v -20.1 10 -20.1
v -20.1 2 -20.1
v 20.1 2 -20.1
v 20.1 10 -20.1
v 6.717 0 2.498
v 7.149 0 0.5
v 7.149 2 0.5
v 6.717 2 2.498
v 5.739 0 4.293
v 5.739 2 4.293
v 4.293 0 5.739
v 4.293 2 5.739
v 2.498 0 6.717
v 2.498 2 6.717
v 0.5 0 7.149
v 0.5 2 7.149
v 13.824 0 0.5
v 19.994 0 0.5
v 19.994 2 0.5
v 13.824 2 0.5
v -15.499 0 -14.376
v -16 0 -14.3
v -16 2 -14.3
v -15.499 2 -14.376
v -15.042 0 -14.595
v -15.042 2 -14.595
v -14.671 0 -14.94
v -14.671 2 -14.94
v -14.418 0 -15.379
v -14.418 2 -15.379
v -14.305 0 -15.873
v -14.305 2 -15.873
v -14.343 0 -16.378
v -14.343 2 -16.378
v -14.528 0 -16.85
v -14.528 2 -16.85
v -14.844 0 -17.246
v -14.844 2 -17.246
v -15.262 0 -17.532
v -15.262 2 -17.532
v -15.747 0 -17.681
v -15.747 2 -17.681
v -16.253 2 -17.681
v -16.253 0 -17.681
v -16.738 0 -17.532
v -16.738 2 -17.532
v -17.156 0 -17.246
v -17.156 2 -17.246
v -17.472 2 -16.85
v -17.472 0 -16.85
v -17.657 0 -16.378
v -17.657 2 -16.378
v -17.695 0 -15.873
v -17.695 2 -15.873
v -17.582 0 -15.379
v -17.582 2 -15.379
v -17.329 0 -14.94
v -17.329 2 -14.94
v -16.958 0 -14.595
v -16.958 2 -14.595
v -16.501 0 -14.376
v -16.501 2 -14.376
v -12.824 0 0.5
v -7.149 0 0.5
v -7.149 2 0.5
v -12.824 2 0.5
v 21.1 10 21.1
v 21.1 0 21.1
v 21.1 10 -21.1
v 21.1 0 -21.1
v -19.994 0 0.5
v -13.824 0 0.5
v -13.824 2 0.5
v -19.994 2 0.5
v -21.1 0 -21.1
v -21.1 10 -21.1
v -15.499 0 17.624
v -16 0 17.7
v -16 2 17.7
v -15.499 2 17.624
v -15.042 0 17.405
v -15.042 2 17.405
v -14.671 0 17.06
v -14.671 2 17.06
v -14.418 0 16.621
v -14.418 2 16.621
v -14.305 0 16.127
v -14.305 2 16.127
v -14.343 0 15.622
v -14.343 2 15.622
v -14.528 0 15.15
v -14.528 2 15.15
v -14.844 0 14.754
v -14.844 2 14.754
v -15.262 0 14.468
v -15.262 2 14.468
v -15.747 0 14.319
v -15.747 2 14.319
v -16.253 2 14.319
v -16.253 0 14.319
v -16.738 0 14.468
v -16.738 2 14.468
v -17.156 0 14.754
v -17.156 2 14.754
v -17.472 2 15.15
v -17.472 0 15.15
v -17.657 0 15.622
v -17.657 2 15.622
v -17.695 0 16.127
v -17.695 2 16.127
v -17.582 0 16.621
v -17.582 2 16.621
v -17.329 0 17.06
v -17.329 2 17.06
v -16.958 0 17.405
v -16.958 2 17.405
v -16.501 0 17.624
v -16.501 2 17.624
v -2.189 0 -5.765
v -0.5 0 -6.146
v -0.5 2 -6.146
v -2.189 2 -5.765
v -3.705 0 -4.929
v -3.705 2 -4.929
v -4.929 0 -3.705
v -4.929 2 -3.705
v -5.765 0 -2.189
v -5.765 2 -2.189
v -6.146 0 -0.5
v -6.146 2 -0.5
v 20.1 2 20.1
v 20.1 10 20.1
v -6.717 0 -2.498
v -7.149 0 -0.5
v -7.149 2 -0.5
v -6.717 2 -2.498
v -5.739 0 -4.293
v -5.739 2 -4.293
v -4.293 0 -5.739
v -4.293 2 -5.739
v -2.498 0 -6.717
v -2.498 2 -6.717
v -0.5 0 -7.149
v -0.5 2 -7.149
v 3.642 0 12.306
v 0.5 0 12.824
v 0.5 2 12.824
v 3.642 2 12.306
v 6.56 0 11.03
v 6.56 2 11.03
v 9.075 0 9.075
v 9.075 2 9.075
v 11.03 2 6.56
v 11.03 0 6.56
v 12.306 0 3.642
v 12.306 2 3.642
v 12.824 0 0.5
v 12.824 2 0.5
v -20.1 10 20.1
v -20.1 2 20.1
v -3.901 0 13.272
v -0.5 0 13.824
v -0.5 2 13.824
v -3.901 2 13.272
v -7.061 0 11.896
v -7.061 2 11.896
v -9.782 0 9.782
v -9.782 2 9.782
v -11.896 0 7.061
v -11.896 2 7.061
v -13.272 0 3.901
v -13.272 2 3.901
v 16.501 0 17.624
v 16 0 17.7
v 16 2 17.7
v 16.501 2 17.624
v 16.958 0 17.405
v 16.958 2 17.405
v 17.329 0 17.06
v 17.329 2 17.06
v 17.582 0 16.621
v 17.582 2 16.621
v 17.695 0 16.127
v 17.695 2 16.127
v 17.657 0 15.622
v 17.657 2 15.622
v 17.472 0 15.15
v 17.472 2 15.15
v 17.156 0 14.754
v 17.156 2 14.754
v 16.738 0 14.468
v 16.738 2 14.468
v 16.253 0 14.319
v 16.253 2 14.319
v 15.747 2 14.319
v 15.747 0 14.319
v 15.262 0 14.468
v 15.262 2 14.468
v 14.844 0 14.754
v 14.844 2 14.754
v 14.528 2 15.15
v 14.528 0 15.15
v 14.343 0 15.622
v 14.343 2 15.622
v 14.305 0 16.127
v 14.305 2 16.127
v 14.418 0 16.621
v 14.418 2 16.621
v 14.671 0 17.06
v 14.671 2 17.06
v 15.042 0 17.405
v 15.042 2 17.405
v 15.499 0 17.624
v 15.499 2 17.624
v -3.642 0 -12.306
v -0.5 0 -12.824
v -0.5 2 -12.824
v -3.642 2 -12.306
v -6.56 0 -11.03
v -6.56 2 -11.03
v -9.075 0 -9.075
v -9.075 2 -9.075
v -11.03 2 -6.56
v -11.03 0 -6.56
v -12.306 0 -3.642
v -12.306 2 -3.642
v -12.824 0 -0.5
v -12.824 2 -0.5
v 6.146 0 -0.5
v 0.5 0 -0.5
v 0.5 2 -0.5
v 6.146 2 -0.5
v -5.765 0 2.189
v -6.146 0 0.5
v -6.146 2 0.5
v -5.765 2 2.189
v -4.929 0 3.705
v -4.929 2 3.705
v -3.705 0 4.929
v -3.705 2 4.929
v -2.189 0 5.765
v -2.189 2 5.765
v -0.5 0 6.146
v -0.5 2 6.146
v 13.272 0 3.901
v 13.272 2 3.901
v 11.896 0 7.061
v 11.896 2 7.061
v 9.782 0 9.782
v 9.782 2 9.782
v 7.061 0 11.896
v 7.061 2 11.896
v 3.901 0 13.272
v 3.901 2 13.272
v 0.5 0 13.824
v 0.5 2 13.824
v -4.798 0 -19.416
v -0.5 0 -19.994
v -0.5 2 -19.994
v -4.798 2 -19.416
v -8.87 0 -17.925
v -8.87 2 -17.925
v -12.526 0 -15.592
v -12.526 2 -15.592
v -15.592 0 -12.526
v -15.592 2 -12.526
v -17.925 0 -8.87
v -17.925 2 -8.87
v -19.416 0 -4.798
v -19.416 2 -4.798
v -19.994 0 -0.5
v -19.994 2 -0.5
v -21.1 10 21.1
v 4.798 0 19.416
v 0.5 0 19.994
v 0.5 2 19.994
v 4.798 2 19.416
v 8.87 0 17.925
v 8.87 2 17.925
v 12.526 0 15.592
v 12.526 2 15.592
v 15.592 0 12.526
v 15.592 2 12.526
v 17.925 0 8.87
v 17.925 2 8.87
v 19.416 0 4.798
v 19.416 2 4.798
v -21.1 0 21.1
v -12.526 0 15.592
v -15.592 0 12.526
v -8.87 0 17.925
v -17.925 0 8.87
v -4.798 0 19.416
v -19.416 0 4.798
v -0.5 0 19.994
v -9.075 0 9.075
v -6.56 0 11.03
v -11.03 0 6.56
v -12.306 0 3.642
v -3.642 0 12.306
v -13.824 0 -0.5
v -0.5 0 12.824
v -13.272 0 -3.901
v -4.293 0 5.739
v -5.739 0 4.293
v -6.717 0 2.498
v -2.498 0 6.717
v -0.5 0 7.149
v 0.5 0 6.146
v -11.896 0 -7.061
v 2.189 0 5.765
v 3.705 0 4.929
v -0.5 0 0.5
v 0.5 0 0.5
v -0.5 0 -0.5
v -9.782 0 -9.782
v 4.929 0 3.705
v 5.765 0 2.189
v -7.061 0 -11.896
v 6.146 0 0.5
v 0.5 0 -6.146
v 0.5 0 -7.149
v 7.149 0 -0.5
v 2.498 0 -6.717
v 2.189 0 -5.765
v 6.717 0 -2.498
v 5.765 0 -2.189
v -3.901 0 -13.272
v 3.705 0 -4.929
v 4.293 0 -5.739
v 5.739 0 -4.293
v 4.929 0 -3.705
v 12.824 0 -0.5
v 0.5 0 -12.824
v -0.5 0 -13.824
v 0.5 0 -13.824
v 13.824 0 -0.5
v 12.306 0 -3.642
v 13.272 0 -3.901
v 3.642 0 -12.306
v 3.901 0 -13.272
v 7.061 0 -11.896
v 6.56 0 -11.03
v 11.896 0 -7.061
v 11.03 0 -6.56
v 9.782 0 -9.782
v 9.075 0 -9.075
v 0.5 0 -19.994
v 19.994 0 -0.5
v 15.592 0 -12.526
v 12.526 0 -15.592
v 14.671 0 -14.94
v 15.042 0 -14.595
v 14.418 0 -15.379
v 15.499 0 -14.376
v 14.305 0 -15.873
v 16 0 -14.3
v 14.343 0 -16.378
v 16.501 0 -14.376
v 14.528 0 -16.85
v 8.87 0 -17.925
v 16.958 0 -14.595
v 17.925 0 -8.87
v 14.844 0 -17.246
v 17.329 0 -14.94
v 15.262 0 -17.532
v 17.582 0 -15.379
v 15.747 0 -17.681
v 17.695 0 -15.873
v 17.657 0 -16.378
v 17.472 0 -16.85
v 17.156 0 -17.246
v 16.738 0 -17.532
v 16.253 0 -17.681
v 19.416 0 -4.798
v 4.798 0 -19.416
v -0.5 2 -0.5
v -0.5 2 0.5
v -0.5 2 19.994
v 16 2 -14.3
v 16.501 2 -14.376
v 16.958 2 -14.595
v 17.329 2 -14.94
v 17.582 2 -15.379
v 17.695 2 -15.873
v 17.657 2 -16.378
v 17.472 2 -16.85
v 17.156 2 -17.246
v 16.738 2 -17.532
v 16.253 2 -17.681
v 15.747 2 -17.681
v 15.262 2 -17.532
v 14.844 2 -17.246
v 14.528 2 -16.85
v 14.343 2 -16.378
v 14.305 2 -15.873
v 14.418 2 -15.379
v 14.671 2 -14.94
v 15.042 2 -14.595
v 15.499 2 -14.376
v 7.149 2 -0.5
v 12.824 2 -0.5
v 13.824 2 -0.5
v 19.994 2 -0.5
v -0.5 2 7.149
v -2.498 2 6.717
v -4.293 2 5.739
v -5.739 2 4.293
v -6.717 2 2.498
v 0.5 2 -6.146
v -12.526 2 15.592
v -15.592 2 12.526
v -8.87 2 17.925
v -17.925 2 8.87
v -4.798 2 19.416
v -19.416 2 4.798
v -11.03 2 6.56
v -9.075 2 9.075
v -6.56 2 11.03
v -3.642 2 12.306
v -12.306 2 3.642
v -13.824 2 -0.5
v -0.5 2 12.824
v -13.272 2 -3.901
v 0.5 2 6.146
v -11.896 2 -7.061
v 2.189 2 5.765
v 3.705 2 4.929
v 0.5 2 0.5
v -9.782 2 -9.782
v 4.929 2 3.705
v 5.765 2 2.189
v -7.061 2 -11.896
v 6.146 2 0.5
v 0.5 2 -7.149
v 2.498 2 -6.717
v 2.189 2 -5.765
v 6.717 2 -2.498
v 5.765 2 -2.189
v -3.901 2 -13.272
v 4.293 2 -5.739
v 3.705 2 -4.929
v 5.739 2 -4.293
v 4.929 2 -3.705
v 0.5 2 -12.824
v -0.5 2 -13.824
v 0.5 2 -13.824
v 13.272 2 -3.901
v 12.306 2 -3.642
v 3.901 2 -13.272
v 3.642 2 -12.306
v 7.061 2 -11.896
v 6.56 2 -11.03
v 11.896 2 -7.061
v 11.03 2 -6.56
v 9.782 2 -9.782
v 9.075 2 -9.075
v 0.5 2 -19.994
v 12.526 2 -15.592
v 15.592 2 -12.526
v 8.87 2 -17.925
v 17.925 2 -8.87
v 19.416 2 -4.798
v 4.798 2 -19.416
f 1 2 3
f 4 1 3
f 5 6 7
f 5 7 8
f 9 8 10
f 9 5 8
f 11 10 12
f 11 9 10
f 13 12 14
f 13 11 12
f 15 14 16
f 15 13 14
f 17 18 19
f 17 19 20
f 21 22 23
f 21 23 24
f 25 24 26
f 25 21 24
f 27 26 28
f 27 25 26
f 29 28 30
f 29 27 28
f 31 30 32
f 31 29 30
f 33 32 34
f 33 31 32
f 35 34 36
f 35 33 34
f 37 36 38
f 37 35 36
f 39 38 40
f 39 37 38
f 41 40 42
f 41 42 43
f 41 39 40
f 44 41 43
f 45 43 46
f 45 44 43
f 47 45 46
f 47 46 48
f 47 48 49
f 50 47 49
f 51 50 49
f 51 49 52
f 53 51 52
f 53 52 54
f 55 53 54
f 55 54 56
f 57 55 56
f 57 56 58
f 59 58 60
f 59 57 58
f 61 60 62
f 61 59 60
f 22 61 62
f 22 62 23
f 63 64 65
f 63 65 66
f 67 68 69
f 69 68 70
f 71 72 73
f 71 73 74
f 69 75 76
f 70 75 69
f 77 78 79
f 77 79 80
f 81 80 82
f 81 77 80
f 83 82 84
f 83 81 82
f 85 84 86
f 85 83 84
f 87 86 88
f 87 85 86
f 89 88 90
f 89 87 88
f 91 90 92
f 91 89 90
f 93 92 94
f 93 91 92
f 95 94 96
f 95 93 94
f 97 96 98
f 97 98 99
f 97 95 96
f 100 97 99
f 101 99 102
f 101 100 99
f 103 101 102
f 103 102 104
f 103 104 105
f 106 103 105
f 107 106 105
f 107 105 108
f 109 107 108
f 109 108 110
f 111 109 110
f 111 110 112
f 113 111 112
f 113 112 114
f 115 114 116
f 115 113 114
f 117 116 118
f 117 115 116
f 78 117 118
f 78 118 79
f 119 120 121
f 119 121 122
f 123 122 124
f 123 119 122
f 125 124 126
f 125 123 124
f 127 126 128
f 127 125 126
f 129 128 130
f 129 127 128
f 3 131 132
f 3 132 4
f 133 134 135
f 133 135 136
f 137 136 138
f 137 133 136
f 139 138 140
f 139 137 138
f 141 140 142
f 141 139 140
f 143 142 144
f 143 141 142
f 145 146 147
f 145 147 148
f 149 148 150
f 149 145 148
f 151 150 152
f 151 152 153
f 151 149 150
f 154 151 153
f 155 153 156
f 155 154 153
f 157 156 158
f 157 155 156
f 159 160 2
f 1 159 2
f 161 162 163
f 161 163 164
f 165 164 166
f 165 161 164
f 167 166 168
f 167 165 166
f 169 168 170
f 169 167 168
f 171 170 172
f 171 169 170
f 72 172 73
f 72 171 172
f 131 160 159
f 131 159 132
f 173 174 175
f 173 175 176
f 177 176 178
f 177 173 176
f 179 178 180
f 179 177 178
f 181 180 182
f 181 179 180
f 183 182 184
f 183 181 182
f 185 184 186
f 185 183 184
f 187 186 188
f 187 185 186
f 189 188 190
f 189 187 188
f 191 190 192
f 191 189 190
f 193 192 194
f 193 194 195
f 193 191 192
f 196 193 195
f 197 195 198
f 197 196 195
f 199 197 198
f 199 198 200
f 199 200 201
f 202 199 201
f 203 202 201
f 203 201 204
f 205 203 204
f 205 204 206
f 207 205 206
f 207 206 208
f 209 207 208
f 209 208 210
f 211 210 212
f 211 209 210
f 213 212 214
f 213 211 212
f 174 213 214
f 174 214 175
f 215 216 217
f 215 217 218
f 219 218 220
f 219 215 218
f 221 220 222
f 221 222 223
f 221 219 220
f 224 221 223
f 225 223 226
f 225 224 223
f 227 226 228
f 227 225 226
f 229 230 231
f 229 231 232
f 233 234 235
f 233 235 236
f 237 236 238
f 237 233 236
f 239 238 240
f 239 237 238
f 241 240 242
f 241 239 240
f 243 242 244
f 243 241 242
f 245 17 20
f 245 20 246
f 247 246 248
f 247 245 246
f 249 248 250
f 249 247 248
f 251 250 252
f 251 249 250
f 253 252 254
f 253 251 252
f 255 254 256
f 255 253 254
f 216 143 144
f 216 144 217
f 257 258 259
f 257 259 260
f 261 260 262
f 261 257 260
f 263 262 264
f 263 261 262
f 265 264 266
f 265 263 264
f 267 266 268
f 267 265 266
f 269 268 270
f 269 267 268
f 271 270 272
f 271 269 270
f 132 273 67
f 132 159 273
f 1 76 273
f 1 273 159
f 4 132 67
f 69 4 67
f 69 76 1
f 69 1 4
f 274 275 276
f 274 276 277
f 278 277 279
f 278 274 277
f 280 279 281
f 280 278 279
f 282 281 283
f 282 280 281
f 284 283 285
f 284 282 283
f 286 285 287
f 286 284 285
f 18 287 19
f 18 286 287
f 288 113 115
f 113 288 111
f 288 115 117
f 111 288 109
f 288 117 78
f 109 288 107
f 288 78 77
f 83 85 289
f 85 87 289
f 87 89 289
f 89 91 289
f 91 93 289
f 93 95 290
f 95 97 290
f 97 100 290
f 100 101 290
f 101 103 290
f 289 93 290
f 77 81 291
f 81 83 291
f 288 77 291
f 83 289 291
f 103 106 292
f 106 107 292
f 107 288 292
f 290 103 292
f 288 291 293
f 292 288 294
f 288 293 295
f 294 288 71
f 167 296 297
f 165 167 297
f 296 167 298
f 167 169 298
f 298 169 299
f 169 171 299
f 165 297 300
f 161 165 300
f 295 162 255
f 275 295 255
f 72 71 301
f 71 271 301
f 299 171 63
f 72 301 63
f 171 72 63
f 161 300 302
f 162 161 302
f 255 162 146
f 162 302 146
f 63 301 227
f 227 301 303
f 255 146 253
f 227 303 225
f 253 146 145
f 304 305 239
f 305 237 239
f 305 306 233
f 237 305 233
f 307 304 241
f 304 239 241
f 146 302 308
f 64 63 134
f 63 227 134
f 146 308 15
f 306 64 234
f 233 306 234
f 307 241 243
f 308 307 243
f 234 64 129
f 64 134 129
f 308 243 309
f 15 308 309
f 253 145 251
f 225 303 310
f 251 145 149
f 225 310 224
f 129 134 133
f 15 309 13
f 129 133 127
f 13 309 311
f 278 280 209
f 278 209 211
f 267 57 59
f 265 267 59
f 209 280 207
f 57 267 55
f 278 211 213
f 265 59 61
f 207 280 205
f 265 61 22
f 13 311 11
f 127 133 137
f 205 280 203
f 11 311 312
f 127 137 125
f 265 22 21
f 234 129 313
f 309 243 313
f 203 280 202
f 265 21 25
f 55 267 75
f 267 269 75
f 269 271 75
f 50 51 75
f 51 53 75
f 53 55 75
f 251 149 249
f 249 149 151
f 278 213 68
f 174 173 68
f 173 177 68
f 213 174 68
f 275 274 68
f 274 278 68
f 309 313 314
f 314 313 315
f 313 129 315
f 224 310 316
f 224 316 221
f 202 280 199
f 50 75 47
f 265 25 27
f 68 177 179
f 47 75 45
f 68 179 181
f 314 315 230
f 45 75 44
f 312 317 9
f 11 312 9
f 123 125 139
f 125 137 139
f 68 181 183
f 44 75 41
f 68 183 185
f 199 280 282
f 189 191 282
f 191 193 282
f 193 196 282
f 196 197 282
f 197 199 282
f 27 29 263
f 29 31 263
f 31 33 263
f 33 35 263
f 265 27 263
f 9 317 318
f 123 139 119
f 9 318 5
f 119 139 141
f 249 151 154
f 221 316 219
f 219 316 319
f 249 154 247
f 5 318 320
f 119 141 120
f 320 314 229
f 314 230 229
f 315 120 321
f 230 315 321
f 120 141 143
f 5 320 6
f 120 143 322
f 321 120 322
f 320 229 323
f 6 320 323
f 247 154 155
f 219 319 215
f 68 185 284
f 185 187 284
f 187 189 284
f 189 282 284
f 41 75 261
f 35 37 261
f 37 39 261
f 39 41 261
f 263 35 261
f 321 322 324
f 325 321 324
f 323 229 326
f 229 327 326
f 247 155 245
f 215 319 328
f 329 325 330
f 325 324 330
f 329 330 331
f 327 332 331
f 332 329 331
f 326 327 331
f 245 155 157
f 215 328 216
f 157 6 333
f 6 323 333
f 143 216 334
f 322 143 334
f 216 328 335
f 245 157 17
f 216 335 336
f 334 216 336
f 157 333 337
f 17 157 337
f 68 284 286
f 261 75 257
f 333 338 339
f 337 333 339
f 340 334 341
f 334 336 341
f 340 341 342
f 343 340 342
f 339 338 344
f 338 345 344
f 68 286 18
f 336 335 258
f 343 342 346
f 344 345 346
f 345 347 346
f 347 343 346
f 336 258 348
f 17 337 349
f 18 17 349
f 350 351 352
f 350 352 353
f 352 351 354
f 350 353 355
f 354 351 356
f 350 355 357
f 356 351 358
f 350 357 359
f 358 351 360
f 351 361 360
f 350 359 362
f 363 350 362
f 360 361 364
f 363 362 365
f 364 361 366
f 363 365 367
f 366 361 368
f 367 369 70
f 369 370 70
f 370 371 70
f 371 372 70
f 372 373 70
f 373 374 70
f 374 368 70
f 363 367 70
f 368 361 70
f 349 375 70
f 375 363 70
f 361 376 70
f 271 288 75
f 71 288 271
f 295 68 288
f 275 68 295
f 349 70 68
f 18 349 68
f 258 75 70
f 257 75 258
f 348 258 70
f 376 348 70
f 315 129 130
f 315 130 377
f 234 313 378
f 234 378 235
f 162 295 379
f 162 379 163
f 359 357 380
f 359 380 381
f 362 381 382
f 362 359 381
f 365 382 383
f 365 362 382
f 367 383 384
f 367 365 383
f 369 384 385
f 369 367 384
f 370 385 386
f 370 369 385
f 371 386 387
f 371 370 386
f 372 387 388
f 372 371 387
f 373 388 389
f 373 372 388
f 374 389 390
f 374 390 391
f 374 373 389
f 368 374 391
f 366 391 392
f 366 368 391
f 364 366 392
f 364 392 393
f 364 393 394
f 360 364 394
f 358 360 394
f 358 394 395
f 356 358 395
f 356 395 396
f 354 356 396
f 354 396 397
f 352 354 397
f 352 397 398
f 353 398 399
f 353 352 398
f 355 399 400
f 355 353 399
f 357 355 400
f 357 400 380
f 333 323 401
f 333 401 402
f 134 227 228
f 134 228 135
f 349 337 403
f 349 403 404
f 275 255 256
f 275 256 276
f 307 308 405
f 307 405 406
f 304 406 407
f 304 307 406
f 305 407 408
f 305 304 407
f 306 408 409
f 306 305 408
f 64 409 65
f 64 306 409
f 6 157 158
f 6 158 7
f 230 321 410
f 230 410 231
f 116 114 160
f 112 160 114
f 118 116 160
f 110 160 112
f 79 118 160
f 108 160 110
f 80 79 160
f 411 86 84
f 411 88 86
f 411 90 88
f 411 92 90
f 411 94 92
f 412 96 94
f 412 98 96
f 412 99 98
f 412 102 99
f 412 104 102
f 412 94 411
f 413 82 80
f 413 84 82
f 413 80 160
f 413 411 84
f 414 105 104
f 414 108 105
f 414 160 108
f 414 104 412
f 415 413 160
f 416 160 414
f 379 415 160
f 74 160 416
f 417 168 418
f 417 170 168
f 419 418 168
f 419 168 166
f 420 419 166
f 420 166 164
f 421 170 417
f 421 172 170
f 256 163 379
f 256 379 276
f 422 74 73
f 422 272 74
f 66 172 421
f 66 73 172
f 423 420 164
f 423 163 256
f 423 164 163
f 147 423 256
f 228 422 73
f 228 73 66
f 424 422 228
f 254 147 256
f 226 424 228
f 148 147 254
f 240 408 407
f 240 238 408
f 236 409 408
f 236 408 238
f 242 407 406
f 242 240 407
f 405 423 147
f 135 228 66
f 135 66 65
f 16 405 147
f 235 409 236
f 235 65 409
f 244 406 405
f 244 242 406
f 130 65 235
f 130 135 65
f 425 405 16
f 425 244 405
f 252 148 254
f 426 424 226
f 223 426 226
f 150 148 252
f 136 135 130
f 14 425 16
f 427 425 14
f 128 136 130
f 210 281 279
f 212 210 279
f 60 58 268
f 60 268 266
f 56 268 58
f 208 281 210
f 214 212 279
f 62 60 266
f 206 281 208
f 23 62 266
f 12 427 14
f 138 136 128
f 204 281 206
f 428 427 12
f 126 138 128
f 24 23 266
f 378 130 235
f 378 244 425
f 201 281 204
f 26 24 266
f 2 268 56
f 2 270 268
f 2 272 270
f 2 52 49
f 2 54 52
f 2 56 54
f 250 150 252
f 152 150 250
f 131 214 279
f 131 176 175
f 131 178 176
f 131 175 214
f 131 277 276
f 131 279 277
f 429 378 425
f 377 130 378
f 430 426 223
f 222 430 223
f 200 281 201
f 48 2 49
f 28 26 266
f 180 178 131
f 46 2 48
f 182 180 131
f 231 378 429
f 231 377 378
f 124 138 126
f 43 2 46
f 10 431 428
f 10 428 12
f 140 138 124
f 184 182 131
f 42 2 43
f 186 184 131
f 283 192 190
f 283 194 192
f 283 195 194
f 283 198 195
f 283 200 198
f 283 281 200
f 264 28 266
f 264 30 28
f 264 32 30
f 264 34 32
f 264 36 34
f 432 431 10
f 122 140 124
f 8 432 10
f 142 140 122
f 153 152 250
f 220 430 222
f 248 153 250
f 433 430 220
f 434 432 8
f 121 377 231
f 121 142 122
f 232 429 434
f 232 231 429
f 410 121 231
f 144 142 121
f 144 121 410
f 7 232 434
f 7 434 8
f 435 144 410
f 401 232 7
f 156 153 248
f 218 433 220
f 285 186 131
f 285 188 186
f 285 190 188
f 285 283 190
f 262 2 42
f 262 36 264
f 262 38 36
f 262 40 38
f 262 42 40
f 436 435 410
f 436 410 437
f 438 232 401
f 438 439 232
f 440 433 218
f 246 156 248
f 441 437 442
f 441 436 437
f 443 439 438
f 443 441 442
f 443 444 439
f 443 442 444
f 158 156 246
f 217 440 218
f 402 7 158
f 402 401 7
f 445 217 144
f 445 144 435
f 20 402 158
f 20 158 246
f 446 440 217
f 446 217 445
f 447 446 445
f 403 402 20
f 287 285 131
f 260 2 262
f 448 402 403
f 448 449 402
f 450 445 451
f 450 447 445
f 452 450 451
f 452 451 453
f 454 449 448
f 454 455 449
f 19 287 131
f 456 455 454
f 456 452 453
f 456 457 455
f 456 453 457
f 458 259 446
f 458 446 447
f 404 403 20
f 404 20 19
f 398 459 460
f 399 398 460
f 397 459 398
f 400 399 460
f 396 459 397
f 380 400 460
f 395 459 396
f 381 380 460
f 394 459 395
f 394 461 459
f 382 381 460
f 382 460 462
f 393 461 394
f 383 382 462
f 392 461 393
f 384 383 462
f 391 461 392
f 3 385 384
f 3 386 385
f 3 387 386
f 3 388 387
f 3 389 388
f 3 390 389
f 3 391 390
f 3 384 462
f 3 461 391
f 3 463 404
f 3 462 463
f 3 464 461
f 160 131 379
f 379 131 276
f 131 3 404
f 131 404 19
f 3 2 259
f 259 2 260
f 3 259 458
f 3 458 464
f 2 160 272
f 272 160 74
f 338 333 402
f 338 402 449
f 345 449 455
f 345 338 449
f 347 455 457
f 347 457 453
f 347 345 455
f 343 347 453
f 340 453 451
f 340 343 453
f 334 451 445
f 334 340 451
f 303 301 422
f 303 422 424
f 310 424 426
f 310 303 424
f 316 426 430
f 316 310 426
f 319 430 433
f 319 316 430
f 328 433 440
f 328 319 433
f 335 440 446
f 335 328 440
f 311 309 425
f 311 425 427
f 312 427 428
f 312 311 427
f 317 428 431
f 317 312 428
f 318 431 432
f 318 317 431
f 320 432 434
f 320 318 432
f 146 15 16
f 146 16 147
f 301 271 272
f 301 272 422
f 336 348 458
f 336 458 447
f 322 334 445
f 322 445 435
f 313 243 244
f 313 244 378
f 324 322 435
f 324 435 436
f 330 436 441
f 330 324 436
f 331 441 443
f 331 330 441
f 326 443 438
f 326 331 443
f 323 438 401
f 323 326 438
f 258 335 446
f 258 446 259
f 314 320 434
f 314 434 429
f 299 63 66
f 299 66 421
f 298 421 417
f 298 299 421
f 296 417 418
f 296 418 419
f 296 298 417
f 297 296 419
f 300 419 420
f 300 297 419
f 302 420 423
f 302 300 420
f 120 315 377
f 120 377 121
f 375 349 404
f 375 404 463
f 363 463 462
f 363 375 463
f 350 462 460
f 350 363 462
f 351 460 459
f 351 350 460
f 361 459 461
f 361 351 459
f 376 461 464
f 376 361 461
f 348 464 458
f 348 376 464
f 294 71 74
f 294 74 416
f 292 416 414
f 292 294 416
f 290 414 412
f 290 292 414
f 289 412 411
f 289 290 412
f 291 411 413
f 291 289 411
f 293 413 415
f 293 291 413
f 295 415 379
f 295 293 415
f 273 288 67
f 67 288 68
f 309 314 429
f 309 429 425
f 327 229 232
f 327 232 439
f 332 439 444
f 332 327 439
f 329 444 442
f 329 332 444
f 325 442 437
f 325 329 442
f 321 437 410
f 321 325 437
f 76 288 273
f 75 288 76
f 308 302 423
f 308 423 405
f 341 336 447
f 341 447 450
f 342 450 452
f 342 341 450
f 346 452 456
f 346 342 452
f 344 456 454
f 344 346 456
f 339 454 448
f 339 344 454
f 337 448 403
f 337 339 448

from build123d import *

# Parameters (mm, degrees)
SKETCH1_W           = 42.2
SKETCH1_H           = 42.2
SKETCH1_R           = 1.7
BOSS_EXTRUDE1_DEPTH = 2
SKETCH1_4_W         = 42.2
SKETCH1_4_H         = 42.2
SKETCH1_4_W_2       = 40.2
SKETCH1_4_H_2       = 40.2
BOSS_EXTRUDE2_DEPTH = 10
CUT_EXTRUDE1_DEPTH  = 2
CIRPATTERN1_COUNT   = 4


with BuildPart() as part:
    # Sketch1 → Boss-Extrude1 (new body)
    with BuildSketch(Plane(origin=(0, 0, 0), x_dir=(1, 0, 0), z_dir=(0, 1, 0))):
        Rectangle(SKETCH1_W, SKETCH1_H)
        with Locations(Location((16, 16, 0), (0, 0, 270))):
            Circle(SKETCH1_R, mode=Mode.SUBTRACT)
        with Locations(Location((16, -16, 0), (0, 0, 270))):
            Circle(SKETCH1_R, mode=Mode.SUBTRACT)
        with Locations(Location((-16, -16, 0), (0, 0, 270))):
            Circle(SKETCH1_R, mode=Mode.SUBTRACT)
        with Locations(Location((-16, 16, 0), (0, 0, 270))):
            Circle(SKETCH1_R, mode=Mode.SUBTRACT)
    extrude(amount=BOSS_EXTRUDE1_DEPTH)

    # Sketch1<4> → Boss-Extrude2 (add)
    with BuildSketch(Plane(origin=(0, 0, 0), x_dir=(1, 0, 0), z_dir=(0, 1, 0))):
        Rectangle(SKETCH1_4_W, SKETCH1_4_H)
        Rectangle(SKETCH1_4_W_2, SKETCH1_4_H_2, mode=Mode.SUBTRACT)
    extrude(amount=BOSS_EXTRUDE2_DEPTH)

    # Sketch1<5> → Cut-Extrude1 (cut)
    with BuildSketch(Plane(origin=(0, 0, 0), x_dir=(1, 0, 0), z_dir=(0, 1, 0))):
        with BuildLine():
            ThreePointArc((12.823589374, 0.5), (9.074537025, 9.074537025), (0.5, 12.823589374))
            Line((0.5, 12.823589374), (0.5, 7.14920353))
            ThreePointArc((0.5, 7.14920353), (5.067598599, 5.067598599), (7.14920353, 0.5))
            Line((7.14920353, 0.5), (12.823589374, 0.5))
        make_face()
        with BuildLine():
            ThreePointArc((6.146362972, 0.5), (4.360491817, 4.360491817), (0.5, 6.146362972))
            Line((0.5, 6.146362972), (0.5, 0.5))
            Line((0.5, 0.5), (6.146362972, 0.5))
        make_face()
        with BuildLine():
            Line((0.5, 19.993749023), (0.5, 13.824294236))
            ThreePointArc((0.5, 13.824294236), (9.781643806, 9.781643806), (13.824294236, 0.5))
            Line((13.824294236, 0.5), (19.993749023, 0.5))
            ThreePointArc((19.993749023, 0.5), (14.142135624, 14.142135624), (0.5, 19.993749023))
        make_face()
    cut_extrude1 = extrude(amount=CUT_EXTRUDE1_DEPTH, mode=Mode.SUBTRACT)

    # CirPattern1: Cut-Extrude1 ×4 about axis
    cirpattern1_axis = Axis((0, 0, 0), (0, 1, 0))
    for i in range(1, CIRPATTERN1_COUNT):
        add(cut_extrude1.rotate(cirpattern1_axis, i * 360 / CIRPATTERN1_COUNT), mode=Mode.SUBTRACT)


solid = part.part
